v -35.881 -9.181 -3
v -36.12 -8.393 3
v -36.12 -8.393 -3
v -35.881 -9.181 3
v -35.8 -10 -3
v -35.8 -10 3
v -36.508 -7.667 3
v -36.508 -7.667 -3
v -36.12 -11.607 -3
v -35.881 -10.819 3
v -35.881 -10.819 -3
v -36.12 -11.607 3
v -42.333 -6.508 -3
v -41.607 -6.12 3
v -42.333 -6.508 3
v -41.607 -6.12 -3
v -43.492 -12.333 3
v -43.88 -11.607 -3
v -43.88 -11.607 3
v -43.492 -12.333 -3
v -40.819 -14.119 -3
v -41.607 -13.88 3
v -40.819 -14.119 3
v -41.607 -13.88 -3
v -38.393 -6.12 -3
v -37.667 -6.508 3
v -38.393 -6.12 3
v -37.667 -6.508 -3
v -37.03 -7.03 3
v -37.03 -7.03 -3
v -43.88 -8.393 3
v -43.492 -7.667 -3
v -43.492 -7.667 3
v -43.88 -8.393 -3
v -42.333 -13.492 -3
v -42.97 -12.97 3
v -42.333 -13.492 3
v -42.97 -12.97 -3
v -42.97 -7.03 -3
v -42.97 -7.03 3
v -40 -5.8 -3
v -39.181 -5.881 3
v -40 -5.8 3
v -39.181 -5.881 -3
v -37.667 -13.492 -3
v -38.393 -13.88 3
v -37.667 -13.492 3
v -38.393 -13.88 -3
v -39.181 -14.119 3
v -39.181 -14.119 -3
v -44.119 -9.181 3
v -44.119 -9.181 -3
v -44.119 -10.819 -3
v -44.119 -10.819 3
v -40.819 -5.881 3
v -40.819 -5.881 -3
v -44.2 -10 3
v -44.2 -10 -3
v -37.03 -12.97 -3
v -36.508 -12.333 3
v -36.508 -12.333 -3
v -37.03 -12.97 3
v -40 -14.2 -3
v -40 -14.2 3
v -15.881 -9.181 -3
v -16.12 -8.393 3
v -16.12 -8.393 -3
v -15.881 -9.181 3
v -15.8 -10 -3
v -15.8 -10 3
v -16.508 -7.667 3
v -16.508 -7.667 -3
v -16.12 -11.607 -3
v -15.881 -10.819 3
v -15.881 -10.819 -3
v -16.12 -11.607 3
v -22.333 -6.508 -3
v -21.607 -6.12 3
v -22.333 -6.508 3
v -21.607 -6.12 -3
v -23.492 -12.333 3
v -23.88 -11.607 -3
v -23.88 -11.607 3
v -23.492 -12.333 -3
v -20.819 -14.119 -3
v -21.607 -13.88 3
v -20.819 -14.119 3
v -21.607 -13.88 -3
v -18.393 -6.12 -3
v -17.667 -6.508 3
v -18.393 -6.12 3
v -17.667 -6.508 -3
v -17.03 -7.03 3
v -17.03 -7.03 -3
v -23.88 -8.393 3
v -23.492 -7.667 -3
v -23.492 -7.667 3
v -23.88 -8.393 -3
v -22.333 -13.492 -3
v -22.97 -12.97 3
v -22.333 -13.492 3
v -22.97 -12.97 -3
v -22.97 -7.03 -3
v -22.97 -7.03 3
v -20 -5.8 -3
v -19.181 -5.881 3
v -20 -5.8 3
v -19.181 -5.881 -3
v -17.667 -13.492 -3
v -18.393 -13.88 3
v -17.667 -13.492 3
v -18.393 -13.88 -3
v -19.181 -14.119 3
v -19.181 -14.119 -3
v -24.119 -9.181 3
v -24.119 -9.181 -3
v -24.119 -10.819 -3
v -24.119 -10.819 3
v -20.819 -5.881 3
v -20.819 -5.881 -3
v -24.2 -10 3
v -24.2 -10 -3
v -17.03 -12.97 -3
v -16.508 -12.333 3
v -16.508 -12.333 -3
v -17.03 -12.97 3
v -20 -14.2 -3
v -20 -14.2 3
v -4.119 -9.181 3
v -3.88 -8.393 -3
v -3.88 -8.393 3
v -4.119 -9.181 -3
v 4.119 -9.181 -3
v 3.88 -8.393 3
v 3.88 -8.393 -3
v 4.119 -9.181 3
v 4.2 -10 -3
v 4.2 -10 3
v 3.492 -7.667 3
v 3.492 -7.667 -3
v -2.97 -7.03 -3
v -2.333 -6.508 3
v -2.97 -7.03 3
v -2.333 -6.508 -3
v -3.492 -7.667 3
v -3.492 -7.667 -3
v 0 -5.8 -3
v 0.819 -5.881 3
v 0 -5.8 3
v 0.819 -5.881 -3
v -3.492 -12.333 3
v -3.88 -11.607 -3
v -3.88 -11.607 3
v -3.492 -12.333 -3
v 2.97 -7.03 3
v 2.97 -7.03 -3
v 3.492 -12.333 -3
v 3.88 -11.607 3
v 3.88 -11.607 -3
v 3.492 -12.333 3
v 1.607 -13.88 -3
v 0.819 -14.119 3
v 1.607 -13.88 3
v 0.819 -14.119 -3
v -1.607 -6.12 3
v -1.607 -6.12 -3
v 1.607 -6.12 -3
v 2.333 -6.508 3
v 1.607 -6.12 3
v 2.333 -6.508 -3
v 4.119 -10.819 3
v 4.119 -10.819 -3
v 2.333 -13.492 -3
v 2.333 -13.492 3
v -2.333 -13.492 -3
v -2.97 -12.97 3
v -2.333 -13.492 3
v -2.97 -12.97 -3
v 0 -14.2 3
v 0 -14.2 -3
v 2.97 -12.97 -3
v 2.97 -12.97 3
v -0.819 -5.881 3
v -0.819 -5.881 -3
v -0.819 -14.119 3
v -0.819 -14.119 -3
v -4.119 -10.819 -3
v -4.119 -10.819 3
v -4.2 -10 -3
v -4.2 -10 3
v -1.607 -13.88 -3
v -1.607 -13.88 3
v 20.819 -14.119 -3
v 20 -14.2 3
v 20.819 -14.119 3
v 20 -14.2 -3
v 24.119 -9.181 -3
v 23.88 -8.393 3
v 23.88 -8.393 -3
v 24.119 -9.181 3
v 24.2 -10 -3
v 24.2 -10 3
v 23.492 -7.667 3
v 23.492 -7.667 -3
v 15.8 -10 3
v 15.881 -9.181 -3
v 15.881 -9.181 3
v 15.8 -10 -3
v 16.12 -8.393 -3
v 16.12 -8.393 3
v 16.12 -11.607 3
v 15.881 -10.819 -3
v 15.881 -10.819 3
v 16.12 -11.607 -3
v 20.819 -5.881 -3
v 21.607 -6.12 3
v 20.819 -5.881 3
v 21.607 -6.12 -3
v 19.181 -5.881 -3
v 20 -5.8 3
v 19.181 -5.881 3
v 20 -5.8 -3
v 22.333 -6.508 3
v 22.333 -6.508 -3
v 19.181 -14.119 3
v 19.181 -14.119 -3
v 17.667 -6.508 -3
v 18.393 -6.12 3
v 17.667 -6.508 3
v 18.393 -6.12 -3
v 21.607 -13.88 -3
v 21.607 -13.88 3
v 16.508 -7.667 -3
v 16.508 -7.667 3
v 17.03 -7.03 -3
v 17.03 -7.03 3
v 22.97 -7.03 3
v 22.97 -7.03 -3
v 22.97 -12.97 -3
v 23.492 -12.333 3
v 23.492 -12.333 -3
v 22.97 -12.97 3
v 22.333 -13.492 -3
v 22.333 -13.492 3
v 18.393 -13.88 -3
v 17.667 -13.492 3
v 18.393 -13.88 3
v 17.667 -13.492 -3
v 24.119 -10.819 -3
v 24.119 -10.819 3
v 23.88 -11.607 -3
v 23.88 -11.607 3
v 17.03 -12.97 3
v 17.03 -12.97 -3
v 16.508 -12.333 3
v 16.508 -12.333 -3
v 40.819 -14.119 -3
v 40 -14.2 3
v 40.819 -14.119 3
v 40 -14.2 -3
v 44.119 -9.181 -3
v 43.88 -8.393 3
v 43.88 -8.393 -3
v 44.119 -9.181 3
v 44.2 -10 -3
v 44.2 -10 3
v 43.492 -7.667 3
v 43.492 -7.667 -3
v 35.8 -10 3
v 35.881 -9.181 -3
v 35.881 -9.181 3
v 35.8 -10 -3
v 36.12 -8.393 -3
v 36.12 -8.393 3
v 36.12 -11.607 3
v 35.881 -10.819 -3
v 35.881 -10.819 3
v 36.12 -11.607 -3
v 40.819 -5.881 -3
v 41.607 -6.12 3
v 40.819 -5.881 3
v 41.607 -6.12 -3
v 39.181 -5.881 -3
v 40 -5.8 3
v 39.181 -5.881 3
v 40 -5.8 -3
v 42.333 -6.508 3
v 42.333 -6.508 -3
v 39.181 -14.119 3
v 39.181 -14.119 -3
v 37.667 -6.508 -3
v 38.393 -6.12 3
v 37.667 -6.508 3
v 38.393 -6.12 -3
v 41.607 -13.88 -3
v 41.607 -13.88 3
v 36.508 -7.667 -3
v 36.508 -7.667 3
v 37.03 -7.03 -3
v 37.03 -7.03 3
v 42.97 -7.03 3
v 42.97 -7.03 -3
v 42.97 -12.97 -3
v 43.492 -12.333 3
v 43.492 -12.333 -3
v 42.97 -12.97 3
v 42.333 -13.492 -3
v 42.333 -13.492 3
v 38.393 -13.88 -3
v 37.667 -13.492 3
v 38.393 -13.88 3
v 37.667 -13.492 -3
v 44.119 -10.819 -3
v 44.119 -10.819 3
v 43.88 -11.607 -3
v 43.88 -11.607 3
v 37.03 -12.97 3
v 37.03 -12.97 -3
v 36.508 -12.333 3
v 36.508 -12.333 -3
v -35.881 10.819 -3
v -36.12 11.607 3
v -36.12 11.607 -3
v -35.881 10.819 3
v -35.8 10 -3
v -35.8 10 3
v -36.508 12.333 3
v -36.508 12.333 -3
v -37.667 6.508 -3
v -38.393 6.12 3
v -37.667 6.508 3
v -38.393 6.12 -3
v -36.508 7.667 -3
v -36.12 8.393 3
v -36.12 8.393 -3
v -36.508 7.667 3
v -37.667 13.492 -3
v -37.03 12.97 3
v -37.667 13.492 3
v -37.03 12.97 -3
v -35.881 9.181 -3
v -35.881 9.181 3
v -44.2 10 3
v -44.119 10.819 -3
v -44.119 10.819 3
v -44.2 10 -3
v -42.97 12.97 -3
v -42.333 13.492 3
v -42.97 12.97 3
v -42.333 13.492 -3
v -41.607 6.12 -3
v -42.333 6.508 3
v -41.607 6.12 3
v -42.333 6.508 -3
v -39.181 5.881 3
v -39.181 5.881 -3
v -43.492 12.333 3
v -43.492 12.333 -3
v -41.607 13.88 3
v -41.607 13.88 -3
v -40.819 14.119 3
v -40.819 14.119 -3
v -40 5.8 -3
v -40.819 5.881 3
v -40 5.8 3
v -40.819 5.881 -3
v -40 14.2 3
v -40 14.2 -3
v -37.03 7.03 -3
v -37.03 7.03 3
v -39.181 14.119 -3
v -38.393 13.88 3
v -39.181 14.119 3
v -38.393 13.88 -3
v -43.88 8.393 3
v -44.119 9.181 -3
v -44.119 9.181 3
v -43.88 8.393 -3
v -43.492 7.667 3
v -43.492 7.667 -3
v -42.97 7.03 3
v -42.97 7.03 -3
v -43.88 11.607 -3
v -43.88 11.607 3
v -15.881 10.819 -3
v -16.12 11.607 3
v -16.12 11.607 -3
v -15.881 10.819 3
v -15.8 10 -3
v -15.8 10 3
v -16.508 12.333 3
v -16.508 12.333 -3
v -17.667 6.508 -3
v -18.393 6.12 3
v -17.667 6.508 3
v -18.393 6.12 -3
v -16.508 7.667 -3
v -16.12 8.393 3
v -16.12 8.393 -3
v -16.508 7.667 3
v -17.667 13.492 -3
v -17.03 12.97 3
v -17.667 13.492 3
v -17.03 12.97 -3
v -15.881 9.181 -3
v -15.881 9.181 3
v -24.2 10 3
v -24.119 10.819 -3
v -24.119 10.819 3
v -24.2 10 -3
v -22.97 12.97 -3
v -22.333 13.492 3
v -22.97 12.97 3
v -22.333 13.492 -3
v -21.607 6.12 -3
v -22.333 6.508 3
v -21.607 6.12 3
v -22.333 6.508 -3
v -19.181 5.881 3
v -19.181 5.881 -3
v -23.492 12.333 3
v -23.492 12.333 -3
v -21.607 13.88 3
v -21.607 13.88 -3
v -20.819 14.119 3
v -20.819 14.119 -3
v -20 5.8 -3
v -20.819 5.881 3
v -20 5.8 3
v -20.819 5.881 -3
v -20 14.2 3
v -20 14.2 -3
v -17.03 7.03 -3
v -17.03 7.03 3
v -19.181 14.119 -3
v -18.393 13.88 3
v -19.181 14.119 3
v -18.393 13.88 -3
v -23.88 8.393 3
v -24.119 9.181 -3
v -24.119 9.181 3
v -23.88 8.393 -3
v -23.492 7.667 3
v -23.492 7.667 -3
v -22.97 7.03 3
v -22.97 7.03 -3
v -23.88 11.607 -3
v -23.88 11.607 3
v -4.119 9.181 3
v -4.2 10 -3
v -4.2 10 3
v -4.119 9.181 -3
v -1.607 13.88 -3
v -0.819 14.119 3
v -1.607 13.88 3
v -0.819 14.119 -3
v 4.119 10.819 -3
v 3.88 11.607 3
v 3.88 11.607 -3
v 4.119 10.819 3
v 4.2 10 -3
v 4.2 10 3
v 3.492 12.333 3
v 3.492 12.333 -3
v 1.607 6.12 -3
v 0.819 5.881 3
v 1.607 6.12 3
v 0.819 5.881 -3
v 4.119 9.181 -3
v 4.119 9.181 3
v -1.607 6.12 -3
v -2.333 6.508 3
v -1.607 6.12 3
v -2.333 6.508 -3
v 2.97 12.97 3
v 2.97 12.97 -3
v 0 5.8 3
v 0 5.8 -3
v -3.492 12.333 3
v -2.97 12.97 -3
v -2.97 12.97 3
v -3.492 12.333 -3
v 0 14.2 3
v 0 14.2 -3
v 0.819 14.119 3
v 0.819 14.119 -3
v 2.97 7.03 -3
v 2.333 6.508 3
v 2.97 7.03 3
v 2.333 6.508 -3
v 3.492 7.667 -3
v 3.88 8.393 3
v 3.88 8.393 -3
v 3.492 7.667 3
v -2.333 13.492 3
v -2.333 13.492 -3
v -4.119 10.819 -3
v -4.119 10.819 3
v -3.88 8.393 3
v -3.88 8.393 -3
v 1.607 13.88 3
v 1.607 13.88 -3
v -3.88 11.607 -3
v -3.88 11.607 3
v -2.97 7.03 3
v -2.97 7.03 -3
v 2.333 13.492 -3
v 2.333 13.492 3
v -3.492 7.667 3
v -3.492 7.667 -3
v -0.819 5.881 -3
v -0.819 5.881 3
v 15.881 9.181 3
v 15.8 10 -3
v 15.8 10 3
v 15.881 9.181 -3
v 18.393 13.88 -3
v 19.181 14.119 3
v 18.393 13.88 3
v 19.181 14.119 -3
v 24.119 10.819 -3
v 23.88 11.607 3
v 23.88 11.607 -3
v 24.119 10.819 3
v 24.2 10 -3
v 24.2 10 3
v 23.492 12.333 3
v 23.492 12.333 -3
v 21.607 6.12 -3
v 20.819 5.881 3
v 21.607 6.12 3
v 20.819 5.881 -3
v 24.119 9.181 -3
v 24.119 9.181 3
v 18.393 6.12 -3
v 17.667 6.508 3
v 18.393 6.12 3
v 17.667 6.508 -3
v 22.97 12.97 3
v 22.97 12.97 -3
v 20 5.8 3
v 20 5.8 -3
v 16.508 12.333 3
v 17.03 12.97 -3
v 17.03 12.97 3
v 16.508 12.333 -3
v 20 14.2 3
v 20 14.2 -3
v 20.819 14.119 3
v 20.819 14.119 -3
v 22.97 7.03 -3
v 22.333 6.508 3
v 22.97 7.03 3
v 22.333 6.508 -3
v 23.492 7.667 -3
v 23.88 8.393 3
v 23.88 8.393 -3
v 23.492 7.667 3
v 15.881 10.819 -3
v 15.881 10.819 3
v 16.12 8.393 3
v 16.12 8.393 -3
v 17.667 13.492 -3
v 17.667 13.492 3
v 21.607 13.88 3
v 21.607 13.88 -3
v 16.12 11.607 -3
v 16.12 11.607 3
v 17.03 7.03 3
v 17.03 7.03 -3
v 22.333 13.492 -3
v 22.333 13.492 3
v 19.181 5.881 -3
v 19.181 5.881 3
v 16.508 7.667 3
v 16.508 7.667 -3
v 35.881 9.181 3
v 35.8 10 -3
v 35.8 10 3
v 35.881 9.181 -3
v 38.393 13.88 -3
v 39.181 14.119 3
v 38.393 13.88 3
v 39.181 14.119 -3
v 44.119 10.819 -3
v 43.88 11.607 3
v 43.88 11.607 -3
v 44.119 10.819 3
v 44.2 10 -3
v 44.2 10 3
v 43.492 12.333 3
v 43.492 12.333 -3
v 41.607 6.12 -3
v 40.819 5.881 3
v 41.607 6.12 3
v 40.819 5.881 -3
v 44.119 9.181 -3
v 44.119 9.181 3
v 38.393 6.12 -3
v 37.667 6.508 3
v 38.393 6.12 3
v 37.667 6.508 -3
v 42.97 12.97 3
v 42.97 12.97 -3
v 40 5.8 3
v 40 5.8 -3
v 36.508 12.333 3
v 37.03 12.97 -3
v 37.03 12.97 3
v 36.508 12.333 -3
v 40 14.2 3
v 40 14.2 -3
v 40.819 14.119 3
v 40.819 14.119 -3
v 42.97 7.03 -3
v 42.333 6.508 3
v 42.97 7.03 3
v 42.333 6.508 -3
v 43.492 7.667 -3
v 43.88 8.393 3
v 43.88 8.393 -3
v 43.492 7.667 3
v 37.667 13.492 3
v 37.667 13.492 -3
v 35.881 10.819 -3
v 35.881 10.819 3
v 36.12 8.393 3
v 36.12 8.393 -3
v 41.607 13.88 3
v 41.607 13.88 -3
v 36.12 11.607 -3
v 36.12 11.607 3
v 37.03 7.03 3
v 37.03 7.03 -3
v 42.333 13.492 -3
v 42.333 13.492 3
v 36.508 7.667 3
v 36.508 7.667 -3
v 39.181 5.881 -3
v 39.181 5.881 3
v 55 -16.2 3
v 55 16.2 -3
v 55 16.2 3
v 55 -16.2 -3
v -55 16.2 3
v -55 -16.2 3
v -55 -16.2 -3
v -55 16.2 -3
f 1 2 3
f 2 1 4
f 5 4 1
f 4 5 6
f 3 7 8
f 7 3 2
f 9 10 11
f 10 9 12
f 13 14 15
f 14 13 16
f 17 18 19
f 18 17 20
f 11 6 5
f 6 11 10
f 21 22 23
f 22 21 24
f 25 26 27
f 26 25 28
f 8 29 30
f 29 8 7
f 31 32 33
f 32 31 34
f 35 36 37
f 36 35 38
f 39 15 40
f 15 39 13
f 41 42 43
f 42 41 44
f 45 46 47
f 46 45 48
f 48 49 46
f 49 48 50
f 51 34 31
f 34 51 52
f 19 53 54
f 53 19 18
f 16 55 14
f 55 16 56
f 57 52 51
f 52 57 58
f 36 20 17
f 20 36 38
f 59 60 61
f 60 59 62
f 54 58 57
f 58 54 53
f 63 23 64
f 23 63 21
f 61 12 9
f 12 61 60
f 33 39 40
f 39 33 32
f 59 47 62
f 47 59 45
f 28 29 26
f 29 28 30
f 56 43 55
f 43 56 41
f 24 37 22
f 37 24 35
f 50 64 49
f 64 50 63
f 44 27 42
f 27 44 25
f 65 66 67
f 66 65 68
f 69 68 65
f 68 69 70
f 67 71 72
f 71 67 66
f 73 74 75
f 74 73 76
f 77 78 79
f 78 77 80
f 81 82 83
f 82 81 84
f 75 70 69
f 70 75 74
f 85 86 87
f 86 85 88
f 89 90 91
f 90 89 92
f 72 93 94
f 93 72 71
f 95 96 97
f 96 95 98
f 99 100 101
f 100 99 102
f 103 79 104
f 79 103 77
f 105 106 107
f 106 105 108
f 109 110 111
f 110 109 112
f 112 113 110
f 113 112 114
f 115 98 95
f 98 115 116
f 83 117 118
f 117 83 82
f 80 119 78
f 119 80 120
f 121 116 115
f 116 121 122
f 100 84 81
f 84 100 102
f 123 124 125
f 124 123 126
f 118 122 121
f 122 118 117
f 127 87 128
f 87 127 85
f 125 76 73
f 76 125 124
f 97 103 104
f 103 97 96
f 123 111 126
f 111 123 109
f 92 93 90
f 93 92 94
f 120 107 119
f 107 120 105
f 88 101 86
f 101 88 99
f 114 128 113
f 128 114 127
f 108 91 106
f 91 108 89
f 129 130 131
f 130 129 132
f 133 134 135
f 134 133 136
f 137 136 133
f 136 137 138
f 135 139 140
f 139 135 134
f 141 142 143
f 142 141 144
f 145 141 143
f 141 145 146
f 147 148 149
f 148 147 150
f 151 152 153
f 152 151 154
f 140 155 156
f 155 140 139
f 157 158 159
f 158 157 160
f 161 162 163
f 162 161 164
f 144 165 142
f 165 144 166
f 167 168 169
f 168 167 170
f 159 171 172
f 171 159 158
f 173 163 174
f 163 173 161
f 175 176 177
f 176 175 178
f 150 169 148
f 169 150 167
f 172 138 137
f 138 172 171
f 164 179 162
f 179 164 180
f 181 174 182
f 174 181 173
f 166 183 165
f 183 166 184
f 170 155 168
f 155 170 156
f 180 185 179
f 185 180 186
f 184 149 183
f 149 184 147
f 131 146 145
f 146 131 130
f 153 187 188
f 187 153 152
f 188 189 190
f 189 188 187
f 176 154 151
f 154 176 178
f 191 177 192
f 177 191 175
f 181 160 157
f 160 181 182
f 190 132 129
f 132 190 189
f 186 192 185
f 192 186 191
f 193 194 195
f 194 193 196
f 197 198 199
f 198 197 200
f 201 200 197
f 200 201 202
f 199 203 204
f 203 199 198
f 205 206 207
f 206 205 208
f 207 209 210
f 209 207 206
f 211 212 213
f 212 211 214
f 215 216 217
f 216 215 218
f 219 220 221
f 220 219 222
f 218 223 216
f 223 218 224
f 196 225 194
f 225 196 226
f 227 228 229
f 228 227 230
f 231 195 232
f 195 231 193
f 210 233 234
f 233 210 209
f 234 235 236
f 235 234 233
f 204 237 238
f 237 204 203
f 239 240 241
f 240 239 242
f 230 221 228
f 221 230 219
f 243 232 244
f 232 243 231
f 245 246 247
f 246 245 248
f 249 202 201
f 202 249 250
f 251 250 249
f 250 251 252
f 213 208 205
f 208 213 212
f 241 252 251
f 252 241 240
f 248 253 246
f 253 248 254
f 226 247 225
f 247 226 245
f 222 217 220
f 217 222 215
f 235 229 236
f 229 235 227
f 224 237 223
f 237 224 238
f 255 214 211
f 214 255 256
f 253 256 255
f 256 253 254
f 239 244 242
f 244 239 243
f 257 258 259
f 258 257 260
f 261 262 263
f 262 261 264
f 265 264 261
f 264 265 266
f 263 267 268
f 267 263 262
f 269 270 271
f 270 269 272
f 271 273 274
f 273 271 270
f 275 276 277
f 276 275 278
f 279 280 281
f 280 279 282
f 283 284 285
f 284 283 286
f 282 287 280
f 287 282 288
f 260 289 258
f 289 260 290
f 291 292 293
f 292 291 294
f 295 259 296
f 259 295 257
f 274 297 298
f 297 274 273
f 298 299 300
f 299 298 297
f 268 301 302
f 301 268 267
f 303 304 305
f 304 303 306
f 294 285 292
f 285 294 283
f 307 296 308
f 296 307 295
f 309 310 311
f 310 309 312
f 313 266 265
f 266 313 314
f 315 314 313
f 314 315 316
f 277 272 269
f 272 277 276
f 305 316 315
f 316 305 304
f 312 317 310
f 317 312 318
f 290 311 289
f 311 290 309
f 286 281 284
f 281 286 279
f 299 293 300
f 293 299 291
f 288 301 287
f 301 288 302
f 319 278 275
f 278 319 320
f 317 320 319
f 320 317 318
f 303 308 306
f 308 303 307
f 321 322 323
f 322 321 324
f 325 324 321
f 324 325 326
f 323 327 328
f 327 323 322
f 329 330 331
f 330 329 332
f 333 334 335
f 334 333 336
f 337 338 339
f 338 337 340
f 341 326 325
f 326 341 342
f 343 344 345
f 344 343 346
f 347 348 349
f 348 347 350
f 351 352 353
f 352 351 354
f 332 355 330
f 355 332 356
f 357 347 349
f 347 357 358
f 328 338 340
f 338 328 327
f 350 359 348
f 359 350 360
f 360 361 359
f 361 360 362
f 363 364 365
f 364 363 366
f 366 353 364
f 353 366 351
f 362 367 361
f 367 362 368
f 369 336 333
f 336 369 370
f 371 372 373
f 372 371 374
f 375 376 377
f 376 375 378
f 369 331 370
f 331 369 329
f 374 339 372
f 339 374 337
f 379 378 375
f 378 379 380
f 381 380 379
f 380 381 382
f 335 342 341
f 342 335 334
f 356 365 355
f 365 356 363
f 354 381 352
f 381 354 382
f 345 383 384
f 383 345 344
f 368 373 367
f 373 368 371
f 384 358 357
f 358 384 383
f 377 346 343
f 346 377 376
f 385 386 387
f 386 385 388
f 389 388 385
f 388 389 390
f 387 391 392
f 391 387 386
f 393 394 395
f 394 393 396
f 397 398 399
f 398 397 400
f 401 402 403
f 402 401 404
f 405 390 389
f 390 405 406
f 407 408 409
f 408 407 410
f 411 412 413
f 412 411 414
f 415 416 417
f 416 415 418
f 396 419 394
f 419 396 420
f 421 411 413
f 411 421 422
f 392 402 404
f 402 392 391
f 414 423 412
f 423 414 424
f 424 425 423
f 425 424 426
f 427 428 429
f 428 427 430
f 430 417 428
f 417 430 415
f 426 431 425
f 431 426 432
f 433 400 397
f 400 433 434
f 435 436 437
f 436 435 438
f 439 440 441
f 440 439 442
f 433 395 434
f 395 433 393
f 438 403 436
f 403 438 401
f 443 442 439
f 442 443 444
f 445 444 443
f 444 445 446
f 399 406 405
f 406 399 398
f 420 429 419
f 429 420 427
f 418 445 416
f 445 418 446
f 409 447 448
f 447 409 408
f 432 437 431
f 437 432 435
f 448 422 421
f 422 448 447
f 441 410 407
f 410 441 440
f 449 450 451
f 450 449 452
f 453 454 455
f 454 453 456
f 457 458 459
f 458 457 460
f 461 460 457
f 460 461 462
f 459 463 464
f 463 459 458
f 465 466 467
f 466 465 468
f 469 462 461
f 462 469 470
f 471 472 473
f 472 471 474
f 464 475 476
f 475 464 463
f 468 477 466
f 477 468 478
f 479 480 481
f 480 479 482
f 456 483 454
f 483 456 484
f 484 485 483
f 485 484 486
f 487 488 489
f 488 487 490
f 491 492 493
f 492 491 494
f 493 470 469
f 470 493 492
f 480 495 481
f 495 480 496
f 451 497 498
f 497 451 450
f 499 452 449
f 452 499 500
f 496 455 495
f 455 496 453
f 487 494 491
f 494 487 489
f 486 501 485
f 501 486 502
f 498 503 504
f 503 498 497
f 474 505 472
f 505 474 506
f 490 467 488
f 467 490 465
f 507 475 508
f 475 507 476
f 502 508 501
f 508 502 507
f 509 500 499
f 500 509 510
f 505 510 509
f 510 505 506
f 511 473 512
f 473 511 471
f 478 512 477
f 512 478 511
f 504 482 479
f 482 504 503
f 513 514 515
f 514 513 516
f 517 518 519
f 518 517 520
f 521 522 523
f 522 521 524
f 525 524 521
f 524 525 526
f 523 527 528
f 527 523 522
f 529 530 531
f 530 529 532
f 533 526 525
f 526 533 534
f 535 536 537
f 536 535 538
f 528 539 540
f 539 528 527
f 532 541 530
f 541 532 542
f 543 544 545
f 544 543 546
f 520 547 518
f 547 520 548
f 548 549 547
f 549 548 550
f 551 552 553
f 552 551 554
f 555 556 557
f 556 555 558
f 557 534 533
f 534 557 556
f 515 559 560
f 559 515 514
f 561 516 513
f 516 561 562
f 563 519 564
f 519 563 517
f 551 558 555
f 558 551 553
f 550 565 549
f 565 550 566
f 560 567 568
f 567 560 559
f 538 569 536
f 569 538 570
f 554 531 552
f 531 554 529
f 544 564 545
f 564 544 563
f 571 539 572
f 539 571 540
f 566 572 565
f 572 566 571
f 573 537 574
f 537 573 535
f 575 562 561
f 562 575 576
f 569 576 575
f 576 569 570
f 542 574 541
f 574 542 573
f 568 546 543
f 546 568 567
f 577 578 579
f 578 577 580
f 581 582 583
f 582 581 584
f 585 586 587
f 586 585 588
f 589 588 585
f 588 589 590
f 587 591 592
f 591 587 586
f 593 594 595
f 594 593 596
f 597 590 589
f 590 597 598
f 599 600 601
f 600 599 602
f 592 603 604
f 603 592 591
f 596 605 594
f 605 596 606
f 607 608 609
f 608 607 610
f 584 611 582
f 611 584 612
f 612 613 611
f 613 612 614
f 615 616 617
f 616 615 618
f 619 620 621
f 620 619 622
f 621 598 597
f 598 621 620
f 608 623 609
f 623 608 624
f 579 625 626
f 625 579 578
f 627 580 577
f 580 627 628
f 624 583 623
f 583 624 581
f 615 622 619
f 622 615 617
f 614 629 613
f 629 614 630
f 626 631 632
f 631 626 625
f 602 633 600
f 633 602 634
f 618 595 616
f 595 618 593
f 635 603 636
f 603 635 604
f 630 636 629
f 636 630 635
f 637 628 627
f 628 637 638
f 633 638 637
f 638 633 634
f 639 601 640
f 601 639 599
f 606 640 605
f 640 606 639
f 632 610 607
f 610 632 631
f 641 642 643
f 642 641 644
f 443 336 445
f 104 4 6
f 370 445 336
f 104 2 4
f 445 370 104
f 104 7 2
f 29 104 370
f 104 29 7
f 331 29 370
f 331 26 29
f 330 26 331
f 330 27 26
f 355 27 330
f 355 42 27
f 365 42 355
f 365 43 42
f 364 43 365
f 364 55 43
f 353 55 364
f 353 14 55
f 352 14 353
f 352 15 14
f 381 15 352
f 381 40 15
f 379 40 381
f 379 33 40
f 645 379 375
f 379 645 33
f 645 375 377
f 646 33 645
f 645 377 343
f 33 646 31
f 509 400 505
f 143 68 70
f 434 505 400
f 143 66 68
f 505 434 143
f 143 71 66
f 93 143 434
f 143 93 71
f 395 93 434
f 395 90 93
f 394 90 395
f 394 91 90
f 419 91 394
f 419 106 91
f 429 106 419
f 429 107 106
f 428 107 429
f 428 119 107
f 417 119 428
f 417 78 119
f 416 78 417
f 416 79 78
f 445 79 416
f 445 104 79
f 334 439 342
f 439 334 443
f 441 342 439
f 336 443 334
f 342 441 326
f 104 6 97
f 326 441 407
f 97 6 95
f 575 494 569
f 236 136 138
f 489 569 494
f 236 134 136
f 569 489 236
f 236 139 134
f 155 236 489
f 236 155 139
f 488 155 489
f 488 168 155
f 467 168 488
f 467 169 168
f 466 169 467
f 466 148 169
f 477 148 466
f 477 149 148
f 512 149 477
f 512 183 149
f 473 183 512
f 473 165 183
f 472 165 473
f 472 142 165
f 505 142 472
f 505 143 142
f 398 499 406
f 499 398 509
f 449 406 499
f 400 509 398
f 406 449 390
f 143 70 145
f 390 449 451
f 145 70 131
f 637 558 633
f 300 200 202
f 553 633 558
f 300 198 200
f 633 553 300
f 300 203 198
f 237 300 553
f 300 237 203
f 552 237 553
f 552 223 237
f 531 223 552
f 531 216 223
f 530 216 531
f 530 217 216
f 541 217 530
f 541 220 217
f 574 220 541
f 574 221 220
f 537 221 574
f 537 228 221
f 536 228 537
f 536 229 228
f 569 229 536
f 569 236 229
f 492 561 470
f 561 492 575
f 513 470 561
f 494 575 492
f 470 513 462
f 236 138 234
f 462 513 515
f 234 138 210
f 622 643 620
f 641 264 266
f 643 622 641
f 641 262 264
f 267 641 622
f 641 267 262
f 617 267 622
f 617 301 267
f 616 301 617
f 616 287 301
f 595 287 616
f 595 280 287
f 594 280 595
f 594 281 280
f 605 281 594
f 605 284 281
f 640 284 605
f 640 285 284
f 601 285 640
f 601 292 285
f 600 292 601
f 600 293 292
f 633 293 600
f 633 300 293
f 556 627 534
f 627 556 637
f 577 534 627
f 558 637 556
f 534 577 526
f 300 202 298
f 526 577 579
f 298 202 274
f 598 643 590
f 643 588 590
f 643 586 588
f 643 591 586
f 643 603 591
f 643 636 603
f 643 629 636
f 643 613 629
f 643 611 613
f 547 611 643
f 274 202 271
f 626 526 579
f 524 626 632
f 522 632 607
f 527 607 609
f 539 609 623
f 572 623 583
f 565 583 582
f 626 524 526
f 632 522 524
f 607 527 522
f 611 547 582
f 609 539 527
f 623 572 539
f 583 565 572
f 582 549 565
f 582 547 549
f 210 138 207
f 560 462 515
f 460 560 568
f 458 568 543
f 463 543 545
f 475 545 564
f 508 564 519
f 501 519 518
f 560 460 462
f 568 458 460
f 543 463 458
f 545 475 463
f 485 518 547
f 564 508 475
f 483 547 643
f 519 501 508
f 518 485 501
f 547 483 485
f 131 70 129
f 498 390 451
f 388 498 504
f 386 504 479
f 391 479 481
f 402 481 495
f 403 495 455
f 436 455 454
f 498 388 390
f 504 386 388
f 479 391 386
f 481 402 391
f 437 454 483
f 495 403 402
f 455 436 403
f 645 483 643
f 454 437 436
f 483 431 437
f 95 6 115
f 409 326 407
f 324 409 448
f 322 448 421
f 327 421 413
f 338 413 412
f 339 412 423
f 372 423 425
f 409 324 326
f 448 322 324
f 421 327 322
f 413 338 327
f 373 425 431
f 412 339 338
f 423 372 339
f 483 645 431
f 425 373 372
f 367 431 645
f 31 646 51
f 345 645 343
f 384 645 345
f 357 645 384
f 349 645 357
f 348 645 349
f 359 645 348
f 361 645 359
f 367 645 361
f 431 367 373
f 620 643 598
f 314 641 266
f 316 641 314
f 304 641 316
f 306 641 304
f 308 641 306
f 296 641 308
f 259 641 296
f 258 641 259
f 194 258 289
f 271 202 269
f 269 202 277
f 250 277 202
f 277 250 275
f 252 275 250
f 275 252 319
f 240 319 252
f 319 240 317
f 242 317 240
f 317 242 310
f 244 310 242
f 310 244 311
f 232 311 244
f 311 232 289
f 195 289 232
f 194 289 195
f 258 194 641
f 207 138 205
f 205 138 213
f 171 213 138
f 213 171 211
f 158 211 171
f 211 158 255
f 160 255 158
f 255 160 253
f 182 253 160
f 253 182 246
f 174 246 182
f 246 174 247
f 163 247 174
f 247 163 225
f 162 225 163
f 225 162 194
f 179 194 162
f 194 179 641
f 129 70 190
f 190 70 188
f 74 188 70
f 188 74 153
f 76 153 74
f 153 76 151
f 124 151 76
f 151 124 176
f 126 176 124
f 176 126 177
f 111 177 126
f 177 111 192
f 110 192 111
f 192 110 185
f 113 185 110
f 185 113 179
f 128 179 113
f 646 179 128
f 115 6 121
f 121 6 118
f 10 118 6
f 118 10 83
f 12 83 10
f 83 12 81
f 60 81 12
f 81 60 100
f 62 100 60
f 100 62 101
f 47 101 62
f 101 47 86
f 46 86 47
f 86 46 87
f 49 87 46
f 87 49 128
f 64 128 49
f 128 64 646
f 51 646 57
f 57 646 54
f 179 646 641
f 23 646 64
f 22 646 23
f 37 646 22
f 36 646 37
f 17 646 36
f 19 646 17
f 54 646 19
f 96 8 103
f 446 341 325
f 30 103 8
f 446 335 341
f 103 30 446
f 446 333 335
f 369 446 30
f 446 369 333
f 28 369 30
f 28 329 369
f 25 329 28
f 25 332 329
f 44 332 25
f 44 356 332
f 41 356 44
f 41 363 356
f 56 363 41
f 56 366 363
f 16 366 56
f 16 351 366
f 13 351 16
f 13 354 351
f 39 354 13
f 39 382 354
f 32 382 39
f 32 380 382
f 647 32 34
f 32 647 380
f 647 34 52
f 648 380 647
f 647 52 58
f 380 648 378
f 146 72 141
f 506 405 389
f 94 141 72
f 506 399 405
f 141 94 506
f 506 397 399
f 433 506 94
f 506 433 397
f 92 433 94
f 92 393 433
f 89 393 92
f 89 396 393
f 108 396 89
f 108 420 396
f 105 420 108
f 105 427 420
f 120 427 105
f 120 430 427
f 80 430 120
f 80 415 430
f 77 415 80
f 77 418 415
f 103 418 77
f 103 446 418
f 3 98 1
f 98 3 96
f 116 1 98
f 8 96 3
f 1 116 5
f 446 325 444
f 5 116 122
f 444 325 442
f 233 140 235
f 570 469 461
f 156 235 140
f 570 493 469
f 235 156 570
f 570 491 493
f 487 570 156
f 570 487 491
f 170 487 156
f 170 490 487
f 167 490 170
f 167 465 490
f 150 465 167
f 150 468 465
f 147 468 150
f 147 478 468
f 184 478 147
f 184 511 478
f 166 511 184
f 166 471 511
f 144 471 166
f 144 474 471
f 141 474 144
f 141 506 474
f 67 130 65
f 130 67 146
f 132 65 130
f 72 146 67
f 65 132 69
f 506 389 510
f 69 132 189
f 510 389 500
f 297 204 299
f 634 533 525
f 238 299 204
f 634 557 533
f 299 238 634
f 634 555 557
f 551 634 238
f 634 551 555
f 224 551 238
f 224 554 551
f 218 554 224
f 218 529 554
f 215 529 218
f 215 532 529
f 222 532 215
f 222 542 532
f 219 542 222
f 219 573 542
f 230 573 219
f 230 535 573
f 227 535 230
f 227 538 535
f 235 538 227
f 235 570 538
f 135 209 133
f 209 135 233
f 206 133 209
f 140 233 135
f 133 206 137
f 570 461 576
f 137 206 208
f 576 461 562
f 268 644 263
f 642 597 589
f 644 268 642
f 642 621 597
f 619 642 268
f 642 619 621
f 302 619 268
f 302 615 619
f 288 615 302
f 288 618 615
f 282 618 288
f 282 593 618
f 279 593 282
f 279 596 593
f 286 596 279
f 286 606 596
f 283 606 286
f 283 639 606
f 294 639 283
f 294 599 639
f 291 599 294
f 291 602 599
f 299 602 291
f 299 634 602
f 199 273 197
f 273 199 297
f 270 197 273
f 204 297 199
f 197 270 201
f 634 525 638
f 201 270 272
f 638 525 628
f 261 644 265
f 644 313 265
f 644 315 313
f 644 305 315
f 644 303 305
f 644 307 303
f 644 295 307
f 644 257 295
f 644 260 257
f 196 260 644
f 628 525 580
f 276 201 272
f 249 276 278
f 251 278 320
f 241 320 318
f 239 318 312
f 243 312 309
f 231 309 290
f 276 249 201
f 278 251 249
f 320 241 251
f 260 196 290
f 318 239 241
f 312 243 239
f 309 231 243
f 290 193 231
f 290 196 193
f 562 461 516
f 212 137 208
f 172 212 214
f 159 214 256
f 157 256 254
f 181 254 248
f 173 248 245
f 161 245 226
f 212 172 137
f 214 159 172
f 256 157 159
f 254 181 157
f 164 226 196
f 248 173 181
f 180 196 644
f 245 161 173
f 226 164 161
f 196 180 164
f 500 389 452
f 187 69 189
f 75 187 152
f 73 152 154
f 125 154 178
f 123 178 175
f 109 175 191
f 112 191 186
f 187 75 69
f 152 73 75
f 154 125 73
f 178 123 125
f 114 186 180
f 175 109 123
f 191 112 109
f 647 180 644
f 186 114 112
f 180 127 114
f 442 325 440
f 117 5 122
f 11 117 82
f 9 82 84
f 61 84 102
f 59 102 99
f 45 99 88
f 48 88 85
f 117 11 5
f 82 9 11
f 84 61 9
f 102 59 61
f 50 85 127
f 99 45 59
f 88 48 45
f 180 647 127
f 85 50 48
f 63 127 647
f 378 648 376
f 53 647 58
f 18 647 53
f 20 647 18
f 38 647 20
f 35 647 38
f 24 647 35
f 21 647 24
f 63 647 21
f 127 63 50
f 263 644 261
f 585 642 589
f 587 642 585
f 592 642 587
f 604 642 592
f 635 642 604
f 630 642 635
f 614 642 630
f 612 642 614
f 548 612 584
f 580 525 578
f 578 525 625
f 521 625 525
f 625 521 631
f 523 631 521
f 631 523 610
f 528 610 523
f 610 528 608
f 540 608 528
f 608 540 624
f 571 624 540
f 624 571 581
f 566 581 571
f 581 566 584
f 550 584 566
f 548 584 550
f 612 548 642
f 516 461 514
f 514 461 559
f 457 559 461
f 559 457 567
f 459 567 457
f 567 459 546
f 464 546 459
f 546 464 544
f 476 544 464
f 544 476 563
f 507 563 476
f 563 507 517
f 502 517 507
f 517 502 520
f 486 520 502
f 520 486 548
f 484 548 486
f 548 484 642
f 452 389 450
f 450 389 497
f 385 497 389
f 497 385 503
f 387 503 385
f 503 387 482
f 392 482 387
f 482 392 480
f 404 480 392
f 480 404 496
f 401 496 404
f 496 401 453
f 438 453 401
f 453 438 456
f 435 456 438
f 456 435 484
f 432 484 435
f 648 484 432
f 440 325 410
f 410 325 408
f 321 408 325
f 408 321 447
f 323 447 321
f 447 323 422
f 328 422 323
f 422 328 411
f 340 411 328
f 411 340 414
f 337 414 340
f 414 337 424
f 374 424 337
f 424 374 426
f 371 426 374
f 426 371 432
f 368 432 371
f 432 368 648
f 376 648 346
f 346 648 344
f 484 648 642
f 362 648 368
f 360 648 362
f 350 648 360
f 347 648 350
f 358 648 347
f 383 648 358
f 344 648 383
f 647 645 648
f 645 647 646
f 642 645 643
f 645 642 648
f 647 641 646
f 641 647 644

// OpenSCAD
$fn = 32;

// ----------------------------------------------------------------------
// Hole bar, 5 x Ø8.4
// tworows layout, 15 mm edge offset
// ----------------------------------------------------------------------

// --- parameters (mm) ---
bar_w = 32.4;     // bar width (Y)
bar_t = 6;        // bar thickness (Z)
holes = 5;        // holes per row
hole_d = 8.4;     // hole diameter
edge = 15;        // offset from the bar end to the first hole
pitch = 20;       // pitch between neighbouring holes
row_offset = 20;  // distance between the two rows

// --- derived feature positions (mm) ---
span = (holes - 1) * pitch;   // = 80   distance between the end holes
bar_l = span + 2 * edge;      // = 110   overall bar length
start_x = -bar_l / 2 + edge;  // = -40   X of the first hole
feature_centers = [
  [start_x + 0 * pitch, -row_offset / 2],
  [start_x + 1 * pitch, -row_offset / 2],
  [start_x + 2 * pitch, -row_offset / 2],
  [start_x + 3 * pitch, -row_offset / 2],
  [start_x + 4 * pitch, -row_offset / 2]
];   // hole centres of the first row
row2_centers = [
  [start_x + 0 * pitch, row_offset / 2],
  [start_x + 1 * pitch, row_offset / 2],
  [start_x + 2 * pitch, row_offset / 2],
  [start_x + 3 * pitch, row_offset / 2],
  [start_x + 4 * pitch, row_offset / 2]
];   // hole centres of the second row

// bar with two rows of holes, both read from their own centre arrays
difference() {
  translate([-bar_l / 2, -bar_w / 2, -bar_t / 2]) cube([bar_l, bar_w, bar_t]);
  for (centre = feature_centers)
    translate([centre[0], centre[1], 0])
      cylinder(d = hole_d, h = bar_t + 2, center = true);
  for (centre = row2_centers)
    translate([centre[0], centre[1], 0])
      cylinder(d = hole_d, h = bar_t + 2, center = true);
}
